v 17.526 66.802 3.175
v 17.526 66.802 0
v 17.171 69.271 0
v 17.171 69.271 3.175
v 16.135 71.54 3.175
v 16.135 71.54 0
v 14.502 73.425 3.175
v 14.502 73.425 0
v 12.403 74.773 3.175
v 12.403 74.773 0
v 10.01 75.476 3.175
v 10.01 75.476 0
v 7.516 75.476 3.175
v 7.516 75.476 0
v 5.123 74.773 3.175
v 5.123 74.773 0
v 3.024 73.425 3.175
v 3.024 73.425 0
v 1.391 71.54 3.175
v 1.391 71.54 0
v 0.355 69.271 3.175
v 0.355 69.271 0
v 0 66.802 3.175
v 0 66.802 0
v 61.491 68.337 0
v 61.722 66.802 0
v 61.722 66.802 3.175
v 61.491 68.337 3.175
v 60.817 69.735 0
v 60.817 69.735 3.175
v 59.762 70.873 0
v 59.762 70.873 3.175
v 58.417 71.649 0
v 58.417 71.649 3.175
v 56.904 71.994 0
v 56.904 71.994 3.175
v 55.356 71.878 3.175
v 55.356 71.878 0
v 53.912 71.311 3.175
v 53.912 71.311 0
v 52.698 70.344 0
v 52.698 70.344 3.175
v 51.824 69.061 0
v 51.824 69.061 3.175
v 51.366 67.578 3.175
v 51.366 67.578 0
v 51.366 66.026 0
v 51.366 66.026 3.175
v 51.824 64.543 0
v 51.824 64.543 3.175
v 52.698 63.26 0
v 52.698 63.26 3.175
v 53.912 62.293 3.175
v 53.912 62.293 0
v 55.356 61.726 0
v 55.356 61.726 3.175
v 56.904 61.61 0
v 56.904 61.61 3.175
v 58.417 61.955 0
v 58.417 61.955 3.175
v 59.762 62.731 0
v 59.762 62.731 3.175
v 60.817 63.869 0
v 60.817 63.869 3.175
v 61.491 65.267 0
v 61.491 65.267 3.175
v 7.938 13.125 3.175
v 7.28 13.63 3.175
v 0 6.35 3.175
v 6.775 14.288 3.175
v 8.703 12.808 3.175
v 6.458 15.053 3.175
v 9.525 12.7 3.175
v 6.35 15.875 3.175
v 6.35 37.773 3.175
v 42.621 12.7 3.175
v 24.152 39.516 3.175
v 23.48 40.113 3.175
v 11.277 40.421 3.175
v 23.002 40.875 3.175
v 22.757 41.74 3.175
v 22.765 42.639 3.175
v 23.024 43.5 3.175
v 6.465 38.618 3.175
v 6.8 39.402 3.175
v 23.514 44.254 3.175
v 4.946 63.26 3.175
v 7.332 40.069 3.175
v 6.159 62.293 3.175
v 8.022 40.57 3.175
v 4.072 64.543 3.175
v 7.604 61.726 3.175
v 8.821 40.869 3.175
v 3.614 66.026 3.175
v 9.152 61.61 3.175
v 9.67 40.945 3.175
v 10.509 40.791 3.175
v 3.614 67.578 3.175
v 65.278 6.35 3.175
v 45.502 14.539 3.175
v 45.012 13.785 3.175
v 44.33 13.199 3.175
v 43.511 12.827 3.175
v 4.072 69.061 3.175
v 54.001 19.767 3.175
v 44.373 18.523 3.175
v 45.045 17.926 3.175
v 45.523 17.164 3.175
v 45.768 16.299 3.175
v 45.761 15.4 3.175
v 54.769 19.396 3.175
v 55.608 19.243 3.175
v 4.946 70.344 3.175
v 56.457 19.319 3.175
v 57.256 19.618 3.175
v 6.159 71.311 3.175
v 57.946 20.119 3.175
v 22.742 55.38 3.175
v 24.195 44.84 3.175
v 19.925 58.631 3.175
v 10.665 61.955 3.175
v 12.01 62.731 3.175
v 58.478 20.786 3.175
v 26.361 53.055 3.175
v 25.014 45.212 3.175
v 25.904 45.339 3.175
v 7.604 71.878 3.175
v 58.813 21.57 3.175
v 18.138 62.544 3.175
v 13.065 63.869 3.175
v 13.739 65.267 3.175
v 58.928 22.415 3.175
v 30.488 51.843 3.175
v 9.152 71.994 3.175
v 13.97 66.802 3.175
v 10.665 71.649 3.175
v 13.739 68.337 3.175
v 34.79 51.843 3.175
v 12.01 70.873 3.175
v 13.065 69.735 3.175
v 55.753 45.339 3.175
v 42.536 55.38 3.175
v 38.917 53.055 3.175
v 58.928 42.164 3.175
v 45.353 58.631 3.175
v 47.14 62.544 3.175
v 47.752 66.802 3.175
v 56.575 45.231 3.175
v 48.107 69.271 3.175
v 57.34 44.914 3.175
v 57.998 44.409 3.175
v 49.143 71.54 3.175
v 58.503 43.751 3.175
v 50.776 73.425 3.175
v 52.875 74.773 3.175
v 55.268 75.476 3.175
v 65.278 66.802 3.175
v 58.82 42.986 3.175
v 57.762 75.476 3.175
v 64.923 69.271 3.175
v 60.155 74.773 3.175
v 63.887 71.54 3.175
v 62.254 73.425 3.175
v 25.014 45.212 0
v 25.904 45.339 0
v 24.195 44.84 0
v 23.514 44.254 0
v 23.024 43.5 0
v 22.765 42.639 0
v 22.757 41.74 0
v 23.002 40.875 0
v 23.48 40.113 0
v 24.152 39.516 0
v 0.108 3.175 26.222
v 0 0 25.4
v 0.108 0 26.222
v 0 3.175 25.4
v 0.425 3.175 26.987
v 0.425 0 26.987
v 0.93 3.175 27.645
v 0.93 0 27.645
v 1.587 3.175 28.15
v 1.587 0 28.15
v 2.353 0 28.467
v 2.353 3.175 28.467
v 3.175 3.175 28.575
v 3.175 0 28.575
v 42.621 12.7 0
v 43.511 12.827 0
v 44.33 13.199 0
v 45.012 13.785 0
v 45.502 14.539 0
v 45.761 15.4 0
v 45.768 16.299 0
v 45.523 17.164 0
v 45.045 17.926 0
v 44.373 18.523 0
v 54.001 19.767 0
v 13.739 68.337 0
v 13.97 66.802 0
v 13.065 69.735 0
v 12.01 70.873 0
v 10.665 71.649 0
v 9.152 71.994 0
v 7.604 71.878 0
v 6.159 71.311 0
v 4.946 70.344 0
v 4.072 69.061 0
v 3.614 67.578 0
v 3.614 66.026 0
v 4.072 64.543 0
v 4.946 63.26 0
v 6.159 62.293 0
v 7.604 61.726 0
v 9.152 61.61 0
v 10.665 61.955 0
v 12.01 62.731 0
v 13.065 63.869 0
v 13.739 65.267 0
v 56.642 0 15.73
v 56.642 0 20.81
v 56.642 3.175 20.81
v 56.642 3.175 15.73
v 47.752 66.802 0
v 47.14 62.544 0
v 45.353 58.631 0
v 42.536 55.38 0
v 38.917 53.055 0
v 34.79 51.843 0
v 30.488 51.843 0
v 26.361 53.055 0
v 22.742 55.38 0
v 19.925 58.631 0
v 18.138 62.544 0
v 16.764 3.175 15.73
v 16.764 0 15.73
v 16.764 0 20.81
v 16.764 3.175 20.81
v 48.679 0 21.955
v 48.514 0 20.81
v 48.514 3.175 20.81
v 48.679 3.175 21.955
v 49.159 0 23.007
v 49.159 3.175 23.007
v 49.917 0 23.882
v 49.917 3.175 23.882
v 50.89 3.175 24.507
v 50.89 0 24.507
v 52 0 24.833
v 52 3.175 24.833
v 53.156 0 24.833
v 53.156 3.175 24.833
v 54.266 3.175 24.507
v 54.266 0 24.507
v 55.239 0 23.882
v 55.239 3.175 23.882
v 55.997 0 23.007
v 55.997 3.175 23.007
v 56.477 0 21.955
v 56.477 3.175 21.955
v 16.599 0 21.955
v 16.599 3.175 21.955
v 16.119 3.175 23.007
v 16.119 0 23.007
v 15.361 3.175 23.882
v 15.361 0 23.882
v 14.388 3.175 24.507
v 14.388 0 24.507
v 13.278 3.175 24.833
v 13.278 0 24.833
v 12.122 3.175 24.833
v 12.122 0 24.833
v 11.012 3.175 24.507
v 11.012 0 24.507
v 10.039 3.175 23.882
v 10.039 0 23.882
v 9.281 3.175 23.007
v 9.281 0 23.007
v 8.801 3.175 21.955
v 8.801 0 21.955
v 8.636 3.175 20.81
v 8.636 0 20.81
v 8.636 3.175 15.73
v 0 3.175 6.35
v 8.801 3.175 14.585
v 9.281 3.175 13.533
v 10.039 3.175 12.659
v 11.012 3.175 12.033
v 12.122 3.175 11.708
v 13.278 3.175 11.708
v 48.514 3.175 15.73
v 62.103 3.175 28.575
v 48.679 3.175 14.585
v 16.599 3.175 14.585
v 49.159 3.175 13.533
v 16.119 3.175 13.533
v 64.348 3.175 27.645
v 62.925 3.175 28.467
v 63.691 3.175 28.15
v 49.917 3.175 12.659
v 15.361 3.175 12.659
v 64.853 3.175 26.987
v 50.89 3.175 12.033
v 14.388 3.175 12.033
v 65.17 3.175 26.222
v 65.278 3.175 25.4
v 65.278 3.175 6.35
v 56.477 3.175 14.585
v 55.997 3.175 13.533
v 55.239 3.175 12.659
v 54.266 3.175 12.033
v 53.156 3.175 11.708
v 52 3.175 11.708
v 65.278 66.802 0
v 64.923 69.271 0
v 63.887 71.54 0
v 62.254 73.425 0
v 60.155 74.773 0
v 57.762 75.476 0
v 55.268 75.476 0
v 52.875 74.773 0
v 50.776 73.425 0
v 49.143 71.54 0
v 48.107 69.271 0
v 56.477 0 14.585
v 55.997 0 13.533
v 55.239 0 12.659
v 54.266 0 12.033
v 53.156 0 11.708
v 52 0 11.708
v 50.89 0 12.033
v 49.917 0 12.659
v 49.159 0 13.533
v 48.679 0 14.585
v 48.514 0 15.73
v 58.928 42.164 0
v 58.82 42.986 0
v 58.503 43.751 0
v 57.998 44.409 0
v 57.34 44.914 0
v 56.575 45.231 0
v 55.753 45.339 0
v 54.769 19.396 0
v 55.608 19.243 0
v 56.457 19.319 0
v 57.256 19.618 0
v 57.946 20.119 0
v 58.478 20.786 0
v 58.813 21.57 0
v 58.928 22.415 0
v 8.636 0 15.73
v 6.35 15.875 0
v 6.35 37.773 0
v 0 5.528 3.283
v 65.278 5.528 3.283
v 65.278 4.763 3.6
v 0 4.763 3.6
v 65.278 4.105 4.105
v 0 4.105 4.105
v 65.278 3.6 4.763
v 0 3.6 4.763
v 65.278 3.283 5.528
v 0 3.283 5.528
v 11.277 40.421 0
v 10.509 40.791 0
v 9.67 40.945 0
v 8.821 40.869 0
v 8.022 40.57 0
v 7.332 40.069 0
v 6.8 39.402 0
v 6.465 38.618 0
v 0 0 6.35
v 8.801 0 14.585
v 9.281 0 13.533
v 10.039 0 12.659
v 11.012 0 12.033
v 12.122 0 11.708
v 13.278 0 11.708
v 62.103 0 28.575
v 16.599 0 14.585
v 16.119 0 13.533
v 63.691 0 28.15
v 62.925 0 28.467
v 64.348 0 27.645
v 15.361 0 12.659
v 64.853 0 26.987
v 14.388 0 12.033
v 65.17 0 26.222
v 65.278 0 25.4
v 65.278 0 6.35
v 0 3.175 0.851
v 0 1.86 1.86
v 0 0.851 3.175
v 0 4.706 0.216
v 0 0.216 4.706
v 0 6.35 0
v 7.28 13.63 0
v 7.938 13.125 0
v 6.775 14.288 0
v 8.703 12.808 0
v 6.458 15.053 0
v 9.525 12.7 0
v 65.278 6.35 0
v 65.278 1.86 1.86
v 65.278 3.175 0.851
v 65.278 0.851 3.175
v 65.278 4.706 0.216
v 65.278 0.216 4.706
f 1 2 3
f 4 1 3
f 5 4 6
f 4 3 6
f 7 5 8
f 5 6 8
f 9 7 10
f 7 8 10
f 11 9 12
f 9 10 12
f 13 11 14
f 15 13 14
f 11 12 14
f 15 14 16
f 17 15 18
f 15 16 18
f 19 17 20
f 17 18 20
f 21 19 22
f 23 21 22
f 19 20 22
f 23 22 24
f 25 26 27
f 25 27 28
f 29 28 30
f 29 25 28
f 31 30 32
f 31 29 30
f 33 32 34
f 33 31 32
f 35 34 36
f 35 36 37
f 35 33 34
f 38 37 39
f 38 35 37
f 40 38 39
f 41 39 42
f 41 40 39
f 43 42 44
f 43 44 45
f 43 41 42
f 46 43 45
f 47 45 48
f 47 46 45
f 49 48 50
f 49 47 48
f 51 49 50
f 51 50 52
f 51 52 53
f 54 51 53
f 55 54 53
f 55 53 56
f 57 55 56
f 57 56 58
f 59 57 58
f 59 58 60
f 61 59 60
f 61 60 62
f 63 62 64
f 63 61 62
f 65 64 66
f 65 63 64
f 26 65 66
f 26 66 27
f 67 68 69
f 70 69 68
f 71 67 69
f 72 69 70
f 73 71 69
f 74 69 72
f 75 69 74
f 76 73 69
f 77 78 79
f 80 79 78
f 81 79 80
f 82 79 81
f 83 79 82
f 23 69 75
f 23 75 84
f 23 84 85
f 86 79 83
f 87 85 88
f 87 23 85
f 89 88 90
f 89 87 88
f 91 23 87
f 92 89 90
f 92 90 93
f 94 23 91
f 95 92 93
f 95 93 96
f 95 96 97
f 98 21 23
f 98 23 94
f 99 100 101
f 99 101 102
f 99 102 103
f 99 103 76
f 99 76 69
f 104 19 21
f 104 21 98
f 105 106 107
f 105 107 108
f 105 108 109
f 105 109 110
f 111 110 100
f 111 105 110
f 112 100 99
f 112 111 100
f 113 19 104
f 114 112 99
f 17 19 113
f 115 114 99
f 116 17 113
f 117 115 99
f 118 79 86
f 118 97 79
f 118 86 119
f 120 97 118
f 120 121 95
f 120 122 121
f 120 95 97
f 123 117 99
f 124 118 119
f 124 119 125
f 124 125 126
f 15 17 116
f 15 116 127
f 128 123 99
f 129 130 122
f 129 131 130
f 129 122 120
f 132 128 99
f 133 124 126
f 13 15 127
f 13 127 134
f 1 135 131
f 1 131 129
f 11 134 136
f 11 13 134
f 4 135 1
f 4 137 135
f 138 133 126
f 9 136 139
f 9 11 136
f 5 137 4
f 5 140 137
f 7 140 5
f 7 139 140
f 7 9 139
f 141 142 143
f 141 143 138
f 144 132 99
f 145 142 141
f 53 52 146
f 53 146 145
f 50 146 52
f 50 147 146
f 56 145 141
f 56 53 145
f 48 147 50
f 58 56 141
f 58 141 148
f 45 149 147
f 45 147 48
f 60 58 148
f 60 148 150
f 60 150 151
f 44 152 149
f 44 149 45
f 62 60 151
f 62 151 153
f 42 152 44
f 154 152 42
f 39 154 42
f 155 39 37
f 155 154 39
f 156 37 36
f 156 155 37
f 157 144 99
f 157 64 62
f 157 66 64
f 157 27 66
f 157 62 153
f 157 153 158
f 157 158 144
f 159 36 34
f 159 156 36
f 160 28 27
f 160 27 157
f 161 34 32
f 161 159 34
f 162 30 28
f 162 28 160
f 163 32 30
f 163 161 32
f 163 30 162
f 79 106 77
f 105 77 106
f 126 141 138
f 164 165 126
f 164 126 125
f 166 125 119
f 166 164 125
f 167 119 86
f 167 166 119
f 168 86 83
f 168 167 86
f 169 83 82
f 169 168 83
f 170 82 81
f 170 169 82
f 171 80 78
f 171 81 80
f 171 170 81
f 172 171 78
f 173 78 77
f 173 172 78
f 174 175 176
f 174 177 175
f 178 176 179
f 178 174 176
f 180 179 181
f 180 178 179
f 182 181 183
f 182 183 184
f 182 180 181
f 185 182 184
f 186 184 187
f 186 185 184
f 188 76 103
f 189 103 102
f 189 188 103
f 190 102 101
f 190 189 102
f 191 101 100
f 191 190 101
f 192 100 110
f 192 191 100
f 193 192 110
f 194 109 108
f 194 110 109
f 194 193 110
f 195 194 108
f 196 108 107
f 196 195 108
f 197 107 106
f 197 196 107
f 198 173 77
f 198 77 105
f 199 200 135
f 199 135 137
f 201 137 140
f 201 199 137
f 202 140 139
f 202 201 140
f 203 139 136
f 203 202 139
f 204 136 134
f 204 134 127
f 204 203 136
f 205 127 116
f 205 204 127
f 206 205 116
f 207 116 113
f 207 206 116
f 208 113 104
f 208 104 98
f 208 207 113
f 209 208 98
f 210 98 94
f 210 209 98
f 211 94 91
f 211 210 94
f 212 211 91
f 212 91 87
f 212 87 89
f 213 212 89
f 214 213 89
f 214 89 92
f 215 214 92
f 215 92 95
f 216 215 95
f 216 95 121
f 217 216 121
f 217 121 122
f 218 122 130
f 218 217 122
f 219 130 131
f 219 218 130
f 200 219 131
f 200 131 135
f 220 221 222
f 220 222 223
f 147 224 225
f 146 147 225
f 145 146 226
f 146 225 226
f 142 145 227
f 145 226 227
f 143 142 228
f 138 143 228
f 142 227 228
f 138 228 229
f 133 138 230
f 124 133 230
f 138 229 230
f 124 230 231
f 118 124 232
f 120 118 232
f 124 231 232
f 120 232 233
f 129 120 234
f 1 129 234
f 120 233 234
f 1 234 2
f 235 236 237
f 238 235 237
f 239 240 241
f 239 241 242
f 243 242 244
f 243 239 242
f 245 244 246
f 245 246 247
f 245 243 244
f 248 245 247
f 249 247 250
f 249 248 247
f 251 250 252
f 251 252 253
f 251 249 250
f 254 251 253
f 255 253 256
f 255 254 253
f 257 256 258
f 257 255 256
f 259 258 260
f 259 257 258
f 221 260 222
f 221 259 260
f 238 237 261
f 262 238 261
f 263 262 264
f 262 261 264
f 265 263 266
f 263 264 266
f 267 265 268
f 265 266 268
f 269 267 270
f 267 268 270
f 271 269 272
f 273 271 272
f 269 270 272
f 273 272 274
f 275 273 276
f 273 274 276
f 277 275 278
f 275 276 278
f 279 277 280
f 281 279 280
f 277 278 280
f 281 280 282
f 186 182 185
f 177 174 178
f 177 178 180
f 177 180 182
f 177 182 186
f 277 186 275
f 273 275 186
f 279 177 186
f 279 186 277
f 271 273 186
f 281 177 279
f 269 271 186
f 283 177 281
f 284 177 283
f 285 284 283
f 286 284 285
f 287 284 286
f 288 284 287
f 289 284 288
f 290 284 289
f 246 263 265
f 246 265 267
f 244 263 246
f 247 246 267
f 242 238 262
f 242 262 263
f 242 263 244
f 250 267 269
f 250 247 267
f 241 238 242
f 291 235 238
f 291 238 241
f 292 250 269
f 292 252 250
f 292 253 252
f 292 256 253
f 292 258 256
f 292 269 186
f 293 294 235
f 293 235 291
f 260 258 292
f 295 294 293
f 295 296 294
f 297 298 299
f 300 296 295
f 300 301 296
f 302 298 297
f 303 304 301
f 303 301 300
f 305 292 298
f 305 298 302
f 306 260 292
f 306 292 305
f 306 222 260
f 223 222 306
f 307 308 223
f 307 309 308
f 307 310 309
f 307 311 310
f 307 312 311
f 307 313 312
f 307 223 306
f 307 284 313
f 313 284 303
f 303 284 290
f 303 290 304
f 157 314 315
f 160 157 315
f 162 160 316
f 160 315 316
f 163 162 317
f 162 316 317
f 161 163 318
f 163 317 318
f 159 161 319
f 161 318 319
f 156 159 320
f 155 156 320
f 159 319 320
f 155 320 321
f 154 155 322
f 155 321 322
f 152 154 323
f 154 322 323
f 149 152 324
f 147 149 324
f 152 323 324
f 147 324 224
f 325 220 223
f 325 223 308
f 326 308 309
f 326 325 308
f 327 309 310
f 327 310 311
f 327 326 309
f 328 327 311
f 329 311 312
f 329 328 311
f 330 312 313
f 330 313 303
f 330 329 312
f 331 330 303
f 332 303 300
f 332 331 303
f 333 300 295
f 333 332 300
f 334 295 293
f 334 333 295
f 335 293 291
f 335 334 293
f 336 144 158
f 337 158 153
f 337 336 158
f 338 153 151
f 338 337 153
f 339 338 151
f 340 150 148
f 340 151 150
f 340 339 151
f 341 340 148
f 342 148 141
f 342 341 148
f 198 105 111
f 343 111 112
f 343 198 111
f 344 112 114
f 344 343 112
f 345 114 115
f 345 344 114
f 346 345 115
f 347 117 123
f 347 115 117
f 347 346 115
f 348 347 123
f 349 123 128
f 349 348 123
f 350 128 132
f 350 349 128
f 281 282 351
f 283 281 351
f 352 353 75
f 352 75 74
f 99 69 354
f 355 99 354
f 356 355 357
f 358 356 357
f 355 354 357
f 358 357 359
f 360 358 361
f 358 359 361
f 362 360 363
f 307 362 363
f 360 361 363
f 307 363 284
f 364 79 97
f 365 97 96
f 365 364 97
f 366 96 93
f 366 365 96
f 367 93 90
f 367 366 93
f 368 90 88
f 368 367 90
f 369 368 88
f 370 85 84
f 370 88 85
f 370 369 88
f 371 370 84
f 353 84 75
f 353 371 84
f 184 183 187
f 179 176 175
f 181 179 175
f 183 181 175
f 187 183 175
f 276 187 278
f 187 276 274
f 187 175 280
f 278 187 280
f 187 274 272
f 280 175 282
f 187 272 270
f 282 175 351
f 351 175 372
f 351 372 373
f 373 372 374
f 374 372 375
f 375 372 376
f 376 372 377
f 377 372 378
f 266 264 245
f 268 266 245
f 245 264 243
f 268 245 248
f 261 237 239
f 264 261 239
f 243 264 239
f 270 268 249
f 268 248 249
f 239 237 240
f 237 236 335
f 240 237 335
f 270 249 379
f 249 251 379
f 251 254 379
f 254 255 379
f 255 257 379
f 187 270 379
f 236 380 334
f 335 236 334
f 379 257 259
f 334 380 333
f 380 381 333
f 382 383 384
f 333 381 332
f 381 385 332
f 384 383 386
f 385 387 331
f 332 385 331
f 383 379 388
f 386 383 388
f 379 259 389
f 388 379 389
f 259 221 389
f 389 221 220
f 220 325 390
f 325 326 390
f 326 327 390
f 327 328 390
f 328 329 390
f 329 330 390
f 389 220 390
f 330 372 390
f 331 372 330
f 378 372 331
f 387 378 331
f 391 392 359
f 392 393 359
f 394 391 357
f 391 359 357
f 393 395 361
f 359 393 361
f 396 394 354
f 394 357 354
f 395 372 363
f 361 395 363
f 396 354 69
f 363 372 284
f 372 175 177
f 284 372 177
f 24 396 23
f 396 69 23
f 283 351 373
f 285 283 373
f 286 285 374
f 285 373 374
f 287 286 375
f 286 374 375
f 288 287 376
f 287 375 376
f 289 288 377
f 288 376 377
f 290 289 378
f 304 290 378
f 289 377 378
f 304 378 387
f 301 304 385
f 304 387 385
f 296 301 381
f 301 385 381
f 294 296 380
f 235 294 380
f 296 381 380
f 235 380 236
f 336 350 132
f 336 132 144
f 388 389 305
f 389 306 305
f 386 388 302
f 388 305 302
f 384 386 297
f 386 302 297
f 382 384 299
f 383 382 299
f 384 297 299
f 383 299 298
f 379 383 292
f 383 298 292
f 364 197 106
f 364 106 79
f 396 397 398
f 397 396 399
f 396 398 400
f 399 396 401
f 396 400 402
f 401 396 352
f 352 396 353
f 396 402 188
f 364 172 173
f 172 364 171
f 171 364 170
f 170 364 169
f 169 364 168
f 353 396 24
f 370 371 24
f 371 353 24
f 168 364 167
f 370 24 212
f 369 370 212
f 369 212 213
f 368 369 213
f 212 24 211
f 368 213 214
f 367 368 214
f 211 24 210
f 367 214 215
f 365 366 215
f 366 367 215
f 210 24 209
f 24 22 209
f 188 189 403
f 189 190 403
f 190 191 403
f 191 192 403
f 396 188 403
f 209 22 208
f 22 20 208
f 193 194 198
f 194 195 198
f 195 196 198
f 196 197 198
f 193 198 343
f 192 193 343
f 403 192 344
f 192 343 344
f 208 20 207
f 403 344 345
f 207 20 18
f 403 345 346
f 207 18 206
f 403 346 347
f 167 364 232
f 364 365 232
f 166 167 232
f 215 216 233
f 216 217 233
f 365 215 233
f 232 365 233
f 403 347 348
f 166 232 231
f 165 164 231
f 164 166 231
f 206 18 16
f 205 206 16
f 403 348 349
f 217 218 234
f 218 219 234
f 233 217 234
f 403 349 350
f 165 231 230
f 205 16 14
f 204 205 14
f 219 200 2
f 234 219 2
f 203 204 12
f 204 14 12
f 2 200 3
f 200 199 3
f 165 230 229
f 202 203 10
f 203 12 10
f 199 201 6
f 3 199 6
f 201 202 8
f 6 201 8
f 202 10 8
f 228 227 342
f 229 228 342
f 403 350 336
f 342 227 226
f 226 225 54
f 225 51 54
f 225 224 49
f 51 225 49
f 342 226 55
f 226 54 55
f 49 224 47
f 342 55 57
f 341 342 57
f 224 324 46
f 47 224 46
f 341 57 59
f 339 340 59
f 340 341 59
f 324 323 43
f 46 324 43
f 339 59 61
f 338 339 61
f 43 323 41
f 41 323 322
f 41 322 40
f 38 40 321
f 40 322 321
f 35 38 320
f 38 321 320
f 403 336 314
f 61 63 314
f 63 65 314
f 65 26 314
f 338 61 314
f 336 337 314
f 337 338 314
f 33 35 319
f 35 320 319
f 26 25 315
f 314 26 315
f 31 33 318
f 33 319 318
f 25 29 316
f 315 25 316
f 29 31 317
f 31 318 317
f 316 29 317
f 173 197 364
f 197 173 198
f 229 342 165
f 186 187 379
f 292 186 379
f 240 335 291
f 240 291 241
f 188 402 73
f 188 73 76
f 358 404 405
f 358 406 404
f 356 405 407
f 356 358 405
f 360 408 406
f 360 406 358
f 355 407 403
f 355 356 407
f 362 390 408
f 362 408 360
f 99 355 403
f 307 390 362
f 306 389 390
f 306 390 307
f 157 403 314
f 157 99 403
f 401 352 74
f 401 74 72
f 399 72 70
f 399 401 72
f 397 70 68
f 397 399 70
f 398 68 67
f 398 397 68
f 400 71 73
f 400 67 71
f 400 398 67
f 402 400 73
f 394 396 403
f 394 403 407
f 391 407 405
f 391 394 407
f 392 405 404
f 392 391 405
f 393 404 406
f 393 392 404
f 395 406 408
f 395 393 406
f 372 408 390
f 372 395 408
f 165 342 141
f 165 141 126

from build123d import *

# Parameters (mm, degrees)
SKETCH1_R              = 5.207
BOSS_EXTRUDE1_DEPTH    = 3.175
SKETCH2_W              = 65.278
SKETCH2_H              = 25.4
BOSS_EXTRUDE2_DEPTH    = 3.175
FILLET1_R              = 3.175
CONVERT_SOLID1_DEPTH   = 65.278
CONVERT_SOLID1_2_DEPTH = 65.278
CUT_EXTRUDE1_DEPTH     = 104.864417073


# Read off the part's stored shape, not the designer's step: Convert-Solid1
with BuildPart() as part:
    # Sketch1 → Boss-Extrude1 (new body)
    with BuildSketch(Plane.XY):
        with BuildLine():
            Line((0, 0), (65.278, 0))
            Line((65.278, 0), (65.278, 66.802))
            ThreePointArc((65.278, 66.802), (56.515, 75.565), (47.752, 66.802))
            ThreePointArc((47.752, 66.802), (32.639, 51.689), (17.526, 66.802))
            ThreePointArc((17.526, 66.802), (8.763, 75.565), (0, 66.802))
            Line((0, 66.802), (0, 0))
        make_face()
        with Locations((8.763, 66.802)):
            Circle(SKETCH1_R, mode=Mode.SUBTRACT)
        with Locations((56.515, 66.802)):
            Circle(SKETCH1_R, mode=Mode.SUBTRACT)
    extrude(amount=BOSS_EXTRUDE1_DEPTH)

    # Sketch2 → Boss-Extrude2 (add)
    with BuildSketch(Plane(origin=(0, 0, 0), x_dir=(1, 0, 0), z_dir=(0, 1, 0))):
        with Locations((32.639, -15.875)):
            Rectangle(SKETCH2_W, SKETCH2_H)
        with BuildLine():
            Line((16.764, -15.73022), (16.764, -20.81022))
            ThreePointArc((16.764, -20.81022), (12.7, -24.87422), (8.636, -20.81022))
            Line((8.636, -20.81022), (8.636, -15.73022))
            ThreePointArc((8.636, -15.73022), (12.7, -11.66622), (16.764, -15.73022))
        make_face(mode=Mode.SUBTRACT)
        with BuildLine():
            Line((48.514, -15.73022), (48.514, -20.81022))
            ThreePointArc((48.514, -20.81022), (52.578, -24.87422), (56.642, -20.81022))
            Line((56.642, -20.81022), (56.642, -15.73022))
            ThreePointArc((56.642, -15.73022), (52.578, -11.66622), (48.514, -15.73022))
        make_face(mode=Mode.SUBTRACT)
    extrude(amount=BOSS_EXTRUDE2_DEPTH)

    # Fillet1
    fillet1_edges = [part.edges().sort_by_distance(p)[0] for p in [
        (0, 1.5875, 28.575),
        (65.278, 1.5875, 28.575),
    ]]
    fillet(fillet1_edges, radius=FILLET1_R)

    # Convert-Solid1 outline → Convert-Solid1 (cut)
    with BuildSketch(Plane.YZ):
        with BuildLine():
            ThreePointArc((6.35, 0), (1.859871939, 1.859871939), (0, 6.35))
            Line((0, 6.35), (0, 0))
            Line((0, 0), (6.35, 0))
        make_face()
    extrude(amount=CONVERT_SOLID1_DEPTH, mode=Mode.SUBTRACT)

    # Convert-Solid1 2 outline → Convert-Solid1 2 (add)
    with BuildSketch(Plane.YZ):
        with BuildLine():
            ThreePointArc((6.35, 3.175), (4.10493597, 4.10493597), (3.175, 6.35))
            Line((3.175, 6.35), (3.175, 3.175))
            Line((3.175, 3.175), (6.35, 3.175))
        make_face()
    extrude(amount=CONVERT_SOLID1_2_DEPTH)

    # Sketch3 → Cut-Extrude1 (cut, through all)
    with BuildSketch(Plane(origin=(0, 0, 0), x_dir=(-1, 0, 0), z_dir=(0, 0, -1))):
        with BuildLine():
            ThreePointArc((-54.001056047, 19.766894808), (-57.256030763, 19.618085357), (-58.928, 22.41478404))
            Line((-58.928, 22.41478404), (-58.928, 42.164))
            ThreePointArc((-58.928, 42.164), (-57.99806403, 44.40906403), (-55.753, 45.339))
            Line((-55.753, 45.339), (-25.904022132, 45.339))
            ThreePointArc((-25.904022132, 45.339), (-22.863654283, 43.078761359), (-24.152078179, 39.516110768))
            Line((-24.152078179, 39.516110768), (-54.001056047, 19.766894808))
        make_face()
        with BuildLine():
            ThreePointArc((-42.621372005, 12.7), (-45.661739854, 14.960238641), (-44.373315958, 18.522889232))
            Line((-44.373315958, 18.522889232), (-11.276943953, 40.42070433))
            ThreePointArc((-11.276943953, 40.42070433), (-8.021969237, 40.569513781), (-6.35, 37.772815098))
            Line((-6.35, 37.772815098), (-6.35, 15.875))
            ThreePointArc((-6.35, 15.875), (-7.27993597, 13.62993597), (-9.525, 12.7))
            Line((-9.525, 12.7), (-42.621372005, 12.7))
        make_face()
    extrude(amount=-CUT_EXTRUDE1_DEPTH, mode=Mode.SUBTRACT)


solid = part.part
